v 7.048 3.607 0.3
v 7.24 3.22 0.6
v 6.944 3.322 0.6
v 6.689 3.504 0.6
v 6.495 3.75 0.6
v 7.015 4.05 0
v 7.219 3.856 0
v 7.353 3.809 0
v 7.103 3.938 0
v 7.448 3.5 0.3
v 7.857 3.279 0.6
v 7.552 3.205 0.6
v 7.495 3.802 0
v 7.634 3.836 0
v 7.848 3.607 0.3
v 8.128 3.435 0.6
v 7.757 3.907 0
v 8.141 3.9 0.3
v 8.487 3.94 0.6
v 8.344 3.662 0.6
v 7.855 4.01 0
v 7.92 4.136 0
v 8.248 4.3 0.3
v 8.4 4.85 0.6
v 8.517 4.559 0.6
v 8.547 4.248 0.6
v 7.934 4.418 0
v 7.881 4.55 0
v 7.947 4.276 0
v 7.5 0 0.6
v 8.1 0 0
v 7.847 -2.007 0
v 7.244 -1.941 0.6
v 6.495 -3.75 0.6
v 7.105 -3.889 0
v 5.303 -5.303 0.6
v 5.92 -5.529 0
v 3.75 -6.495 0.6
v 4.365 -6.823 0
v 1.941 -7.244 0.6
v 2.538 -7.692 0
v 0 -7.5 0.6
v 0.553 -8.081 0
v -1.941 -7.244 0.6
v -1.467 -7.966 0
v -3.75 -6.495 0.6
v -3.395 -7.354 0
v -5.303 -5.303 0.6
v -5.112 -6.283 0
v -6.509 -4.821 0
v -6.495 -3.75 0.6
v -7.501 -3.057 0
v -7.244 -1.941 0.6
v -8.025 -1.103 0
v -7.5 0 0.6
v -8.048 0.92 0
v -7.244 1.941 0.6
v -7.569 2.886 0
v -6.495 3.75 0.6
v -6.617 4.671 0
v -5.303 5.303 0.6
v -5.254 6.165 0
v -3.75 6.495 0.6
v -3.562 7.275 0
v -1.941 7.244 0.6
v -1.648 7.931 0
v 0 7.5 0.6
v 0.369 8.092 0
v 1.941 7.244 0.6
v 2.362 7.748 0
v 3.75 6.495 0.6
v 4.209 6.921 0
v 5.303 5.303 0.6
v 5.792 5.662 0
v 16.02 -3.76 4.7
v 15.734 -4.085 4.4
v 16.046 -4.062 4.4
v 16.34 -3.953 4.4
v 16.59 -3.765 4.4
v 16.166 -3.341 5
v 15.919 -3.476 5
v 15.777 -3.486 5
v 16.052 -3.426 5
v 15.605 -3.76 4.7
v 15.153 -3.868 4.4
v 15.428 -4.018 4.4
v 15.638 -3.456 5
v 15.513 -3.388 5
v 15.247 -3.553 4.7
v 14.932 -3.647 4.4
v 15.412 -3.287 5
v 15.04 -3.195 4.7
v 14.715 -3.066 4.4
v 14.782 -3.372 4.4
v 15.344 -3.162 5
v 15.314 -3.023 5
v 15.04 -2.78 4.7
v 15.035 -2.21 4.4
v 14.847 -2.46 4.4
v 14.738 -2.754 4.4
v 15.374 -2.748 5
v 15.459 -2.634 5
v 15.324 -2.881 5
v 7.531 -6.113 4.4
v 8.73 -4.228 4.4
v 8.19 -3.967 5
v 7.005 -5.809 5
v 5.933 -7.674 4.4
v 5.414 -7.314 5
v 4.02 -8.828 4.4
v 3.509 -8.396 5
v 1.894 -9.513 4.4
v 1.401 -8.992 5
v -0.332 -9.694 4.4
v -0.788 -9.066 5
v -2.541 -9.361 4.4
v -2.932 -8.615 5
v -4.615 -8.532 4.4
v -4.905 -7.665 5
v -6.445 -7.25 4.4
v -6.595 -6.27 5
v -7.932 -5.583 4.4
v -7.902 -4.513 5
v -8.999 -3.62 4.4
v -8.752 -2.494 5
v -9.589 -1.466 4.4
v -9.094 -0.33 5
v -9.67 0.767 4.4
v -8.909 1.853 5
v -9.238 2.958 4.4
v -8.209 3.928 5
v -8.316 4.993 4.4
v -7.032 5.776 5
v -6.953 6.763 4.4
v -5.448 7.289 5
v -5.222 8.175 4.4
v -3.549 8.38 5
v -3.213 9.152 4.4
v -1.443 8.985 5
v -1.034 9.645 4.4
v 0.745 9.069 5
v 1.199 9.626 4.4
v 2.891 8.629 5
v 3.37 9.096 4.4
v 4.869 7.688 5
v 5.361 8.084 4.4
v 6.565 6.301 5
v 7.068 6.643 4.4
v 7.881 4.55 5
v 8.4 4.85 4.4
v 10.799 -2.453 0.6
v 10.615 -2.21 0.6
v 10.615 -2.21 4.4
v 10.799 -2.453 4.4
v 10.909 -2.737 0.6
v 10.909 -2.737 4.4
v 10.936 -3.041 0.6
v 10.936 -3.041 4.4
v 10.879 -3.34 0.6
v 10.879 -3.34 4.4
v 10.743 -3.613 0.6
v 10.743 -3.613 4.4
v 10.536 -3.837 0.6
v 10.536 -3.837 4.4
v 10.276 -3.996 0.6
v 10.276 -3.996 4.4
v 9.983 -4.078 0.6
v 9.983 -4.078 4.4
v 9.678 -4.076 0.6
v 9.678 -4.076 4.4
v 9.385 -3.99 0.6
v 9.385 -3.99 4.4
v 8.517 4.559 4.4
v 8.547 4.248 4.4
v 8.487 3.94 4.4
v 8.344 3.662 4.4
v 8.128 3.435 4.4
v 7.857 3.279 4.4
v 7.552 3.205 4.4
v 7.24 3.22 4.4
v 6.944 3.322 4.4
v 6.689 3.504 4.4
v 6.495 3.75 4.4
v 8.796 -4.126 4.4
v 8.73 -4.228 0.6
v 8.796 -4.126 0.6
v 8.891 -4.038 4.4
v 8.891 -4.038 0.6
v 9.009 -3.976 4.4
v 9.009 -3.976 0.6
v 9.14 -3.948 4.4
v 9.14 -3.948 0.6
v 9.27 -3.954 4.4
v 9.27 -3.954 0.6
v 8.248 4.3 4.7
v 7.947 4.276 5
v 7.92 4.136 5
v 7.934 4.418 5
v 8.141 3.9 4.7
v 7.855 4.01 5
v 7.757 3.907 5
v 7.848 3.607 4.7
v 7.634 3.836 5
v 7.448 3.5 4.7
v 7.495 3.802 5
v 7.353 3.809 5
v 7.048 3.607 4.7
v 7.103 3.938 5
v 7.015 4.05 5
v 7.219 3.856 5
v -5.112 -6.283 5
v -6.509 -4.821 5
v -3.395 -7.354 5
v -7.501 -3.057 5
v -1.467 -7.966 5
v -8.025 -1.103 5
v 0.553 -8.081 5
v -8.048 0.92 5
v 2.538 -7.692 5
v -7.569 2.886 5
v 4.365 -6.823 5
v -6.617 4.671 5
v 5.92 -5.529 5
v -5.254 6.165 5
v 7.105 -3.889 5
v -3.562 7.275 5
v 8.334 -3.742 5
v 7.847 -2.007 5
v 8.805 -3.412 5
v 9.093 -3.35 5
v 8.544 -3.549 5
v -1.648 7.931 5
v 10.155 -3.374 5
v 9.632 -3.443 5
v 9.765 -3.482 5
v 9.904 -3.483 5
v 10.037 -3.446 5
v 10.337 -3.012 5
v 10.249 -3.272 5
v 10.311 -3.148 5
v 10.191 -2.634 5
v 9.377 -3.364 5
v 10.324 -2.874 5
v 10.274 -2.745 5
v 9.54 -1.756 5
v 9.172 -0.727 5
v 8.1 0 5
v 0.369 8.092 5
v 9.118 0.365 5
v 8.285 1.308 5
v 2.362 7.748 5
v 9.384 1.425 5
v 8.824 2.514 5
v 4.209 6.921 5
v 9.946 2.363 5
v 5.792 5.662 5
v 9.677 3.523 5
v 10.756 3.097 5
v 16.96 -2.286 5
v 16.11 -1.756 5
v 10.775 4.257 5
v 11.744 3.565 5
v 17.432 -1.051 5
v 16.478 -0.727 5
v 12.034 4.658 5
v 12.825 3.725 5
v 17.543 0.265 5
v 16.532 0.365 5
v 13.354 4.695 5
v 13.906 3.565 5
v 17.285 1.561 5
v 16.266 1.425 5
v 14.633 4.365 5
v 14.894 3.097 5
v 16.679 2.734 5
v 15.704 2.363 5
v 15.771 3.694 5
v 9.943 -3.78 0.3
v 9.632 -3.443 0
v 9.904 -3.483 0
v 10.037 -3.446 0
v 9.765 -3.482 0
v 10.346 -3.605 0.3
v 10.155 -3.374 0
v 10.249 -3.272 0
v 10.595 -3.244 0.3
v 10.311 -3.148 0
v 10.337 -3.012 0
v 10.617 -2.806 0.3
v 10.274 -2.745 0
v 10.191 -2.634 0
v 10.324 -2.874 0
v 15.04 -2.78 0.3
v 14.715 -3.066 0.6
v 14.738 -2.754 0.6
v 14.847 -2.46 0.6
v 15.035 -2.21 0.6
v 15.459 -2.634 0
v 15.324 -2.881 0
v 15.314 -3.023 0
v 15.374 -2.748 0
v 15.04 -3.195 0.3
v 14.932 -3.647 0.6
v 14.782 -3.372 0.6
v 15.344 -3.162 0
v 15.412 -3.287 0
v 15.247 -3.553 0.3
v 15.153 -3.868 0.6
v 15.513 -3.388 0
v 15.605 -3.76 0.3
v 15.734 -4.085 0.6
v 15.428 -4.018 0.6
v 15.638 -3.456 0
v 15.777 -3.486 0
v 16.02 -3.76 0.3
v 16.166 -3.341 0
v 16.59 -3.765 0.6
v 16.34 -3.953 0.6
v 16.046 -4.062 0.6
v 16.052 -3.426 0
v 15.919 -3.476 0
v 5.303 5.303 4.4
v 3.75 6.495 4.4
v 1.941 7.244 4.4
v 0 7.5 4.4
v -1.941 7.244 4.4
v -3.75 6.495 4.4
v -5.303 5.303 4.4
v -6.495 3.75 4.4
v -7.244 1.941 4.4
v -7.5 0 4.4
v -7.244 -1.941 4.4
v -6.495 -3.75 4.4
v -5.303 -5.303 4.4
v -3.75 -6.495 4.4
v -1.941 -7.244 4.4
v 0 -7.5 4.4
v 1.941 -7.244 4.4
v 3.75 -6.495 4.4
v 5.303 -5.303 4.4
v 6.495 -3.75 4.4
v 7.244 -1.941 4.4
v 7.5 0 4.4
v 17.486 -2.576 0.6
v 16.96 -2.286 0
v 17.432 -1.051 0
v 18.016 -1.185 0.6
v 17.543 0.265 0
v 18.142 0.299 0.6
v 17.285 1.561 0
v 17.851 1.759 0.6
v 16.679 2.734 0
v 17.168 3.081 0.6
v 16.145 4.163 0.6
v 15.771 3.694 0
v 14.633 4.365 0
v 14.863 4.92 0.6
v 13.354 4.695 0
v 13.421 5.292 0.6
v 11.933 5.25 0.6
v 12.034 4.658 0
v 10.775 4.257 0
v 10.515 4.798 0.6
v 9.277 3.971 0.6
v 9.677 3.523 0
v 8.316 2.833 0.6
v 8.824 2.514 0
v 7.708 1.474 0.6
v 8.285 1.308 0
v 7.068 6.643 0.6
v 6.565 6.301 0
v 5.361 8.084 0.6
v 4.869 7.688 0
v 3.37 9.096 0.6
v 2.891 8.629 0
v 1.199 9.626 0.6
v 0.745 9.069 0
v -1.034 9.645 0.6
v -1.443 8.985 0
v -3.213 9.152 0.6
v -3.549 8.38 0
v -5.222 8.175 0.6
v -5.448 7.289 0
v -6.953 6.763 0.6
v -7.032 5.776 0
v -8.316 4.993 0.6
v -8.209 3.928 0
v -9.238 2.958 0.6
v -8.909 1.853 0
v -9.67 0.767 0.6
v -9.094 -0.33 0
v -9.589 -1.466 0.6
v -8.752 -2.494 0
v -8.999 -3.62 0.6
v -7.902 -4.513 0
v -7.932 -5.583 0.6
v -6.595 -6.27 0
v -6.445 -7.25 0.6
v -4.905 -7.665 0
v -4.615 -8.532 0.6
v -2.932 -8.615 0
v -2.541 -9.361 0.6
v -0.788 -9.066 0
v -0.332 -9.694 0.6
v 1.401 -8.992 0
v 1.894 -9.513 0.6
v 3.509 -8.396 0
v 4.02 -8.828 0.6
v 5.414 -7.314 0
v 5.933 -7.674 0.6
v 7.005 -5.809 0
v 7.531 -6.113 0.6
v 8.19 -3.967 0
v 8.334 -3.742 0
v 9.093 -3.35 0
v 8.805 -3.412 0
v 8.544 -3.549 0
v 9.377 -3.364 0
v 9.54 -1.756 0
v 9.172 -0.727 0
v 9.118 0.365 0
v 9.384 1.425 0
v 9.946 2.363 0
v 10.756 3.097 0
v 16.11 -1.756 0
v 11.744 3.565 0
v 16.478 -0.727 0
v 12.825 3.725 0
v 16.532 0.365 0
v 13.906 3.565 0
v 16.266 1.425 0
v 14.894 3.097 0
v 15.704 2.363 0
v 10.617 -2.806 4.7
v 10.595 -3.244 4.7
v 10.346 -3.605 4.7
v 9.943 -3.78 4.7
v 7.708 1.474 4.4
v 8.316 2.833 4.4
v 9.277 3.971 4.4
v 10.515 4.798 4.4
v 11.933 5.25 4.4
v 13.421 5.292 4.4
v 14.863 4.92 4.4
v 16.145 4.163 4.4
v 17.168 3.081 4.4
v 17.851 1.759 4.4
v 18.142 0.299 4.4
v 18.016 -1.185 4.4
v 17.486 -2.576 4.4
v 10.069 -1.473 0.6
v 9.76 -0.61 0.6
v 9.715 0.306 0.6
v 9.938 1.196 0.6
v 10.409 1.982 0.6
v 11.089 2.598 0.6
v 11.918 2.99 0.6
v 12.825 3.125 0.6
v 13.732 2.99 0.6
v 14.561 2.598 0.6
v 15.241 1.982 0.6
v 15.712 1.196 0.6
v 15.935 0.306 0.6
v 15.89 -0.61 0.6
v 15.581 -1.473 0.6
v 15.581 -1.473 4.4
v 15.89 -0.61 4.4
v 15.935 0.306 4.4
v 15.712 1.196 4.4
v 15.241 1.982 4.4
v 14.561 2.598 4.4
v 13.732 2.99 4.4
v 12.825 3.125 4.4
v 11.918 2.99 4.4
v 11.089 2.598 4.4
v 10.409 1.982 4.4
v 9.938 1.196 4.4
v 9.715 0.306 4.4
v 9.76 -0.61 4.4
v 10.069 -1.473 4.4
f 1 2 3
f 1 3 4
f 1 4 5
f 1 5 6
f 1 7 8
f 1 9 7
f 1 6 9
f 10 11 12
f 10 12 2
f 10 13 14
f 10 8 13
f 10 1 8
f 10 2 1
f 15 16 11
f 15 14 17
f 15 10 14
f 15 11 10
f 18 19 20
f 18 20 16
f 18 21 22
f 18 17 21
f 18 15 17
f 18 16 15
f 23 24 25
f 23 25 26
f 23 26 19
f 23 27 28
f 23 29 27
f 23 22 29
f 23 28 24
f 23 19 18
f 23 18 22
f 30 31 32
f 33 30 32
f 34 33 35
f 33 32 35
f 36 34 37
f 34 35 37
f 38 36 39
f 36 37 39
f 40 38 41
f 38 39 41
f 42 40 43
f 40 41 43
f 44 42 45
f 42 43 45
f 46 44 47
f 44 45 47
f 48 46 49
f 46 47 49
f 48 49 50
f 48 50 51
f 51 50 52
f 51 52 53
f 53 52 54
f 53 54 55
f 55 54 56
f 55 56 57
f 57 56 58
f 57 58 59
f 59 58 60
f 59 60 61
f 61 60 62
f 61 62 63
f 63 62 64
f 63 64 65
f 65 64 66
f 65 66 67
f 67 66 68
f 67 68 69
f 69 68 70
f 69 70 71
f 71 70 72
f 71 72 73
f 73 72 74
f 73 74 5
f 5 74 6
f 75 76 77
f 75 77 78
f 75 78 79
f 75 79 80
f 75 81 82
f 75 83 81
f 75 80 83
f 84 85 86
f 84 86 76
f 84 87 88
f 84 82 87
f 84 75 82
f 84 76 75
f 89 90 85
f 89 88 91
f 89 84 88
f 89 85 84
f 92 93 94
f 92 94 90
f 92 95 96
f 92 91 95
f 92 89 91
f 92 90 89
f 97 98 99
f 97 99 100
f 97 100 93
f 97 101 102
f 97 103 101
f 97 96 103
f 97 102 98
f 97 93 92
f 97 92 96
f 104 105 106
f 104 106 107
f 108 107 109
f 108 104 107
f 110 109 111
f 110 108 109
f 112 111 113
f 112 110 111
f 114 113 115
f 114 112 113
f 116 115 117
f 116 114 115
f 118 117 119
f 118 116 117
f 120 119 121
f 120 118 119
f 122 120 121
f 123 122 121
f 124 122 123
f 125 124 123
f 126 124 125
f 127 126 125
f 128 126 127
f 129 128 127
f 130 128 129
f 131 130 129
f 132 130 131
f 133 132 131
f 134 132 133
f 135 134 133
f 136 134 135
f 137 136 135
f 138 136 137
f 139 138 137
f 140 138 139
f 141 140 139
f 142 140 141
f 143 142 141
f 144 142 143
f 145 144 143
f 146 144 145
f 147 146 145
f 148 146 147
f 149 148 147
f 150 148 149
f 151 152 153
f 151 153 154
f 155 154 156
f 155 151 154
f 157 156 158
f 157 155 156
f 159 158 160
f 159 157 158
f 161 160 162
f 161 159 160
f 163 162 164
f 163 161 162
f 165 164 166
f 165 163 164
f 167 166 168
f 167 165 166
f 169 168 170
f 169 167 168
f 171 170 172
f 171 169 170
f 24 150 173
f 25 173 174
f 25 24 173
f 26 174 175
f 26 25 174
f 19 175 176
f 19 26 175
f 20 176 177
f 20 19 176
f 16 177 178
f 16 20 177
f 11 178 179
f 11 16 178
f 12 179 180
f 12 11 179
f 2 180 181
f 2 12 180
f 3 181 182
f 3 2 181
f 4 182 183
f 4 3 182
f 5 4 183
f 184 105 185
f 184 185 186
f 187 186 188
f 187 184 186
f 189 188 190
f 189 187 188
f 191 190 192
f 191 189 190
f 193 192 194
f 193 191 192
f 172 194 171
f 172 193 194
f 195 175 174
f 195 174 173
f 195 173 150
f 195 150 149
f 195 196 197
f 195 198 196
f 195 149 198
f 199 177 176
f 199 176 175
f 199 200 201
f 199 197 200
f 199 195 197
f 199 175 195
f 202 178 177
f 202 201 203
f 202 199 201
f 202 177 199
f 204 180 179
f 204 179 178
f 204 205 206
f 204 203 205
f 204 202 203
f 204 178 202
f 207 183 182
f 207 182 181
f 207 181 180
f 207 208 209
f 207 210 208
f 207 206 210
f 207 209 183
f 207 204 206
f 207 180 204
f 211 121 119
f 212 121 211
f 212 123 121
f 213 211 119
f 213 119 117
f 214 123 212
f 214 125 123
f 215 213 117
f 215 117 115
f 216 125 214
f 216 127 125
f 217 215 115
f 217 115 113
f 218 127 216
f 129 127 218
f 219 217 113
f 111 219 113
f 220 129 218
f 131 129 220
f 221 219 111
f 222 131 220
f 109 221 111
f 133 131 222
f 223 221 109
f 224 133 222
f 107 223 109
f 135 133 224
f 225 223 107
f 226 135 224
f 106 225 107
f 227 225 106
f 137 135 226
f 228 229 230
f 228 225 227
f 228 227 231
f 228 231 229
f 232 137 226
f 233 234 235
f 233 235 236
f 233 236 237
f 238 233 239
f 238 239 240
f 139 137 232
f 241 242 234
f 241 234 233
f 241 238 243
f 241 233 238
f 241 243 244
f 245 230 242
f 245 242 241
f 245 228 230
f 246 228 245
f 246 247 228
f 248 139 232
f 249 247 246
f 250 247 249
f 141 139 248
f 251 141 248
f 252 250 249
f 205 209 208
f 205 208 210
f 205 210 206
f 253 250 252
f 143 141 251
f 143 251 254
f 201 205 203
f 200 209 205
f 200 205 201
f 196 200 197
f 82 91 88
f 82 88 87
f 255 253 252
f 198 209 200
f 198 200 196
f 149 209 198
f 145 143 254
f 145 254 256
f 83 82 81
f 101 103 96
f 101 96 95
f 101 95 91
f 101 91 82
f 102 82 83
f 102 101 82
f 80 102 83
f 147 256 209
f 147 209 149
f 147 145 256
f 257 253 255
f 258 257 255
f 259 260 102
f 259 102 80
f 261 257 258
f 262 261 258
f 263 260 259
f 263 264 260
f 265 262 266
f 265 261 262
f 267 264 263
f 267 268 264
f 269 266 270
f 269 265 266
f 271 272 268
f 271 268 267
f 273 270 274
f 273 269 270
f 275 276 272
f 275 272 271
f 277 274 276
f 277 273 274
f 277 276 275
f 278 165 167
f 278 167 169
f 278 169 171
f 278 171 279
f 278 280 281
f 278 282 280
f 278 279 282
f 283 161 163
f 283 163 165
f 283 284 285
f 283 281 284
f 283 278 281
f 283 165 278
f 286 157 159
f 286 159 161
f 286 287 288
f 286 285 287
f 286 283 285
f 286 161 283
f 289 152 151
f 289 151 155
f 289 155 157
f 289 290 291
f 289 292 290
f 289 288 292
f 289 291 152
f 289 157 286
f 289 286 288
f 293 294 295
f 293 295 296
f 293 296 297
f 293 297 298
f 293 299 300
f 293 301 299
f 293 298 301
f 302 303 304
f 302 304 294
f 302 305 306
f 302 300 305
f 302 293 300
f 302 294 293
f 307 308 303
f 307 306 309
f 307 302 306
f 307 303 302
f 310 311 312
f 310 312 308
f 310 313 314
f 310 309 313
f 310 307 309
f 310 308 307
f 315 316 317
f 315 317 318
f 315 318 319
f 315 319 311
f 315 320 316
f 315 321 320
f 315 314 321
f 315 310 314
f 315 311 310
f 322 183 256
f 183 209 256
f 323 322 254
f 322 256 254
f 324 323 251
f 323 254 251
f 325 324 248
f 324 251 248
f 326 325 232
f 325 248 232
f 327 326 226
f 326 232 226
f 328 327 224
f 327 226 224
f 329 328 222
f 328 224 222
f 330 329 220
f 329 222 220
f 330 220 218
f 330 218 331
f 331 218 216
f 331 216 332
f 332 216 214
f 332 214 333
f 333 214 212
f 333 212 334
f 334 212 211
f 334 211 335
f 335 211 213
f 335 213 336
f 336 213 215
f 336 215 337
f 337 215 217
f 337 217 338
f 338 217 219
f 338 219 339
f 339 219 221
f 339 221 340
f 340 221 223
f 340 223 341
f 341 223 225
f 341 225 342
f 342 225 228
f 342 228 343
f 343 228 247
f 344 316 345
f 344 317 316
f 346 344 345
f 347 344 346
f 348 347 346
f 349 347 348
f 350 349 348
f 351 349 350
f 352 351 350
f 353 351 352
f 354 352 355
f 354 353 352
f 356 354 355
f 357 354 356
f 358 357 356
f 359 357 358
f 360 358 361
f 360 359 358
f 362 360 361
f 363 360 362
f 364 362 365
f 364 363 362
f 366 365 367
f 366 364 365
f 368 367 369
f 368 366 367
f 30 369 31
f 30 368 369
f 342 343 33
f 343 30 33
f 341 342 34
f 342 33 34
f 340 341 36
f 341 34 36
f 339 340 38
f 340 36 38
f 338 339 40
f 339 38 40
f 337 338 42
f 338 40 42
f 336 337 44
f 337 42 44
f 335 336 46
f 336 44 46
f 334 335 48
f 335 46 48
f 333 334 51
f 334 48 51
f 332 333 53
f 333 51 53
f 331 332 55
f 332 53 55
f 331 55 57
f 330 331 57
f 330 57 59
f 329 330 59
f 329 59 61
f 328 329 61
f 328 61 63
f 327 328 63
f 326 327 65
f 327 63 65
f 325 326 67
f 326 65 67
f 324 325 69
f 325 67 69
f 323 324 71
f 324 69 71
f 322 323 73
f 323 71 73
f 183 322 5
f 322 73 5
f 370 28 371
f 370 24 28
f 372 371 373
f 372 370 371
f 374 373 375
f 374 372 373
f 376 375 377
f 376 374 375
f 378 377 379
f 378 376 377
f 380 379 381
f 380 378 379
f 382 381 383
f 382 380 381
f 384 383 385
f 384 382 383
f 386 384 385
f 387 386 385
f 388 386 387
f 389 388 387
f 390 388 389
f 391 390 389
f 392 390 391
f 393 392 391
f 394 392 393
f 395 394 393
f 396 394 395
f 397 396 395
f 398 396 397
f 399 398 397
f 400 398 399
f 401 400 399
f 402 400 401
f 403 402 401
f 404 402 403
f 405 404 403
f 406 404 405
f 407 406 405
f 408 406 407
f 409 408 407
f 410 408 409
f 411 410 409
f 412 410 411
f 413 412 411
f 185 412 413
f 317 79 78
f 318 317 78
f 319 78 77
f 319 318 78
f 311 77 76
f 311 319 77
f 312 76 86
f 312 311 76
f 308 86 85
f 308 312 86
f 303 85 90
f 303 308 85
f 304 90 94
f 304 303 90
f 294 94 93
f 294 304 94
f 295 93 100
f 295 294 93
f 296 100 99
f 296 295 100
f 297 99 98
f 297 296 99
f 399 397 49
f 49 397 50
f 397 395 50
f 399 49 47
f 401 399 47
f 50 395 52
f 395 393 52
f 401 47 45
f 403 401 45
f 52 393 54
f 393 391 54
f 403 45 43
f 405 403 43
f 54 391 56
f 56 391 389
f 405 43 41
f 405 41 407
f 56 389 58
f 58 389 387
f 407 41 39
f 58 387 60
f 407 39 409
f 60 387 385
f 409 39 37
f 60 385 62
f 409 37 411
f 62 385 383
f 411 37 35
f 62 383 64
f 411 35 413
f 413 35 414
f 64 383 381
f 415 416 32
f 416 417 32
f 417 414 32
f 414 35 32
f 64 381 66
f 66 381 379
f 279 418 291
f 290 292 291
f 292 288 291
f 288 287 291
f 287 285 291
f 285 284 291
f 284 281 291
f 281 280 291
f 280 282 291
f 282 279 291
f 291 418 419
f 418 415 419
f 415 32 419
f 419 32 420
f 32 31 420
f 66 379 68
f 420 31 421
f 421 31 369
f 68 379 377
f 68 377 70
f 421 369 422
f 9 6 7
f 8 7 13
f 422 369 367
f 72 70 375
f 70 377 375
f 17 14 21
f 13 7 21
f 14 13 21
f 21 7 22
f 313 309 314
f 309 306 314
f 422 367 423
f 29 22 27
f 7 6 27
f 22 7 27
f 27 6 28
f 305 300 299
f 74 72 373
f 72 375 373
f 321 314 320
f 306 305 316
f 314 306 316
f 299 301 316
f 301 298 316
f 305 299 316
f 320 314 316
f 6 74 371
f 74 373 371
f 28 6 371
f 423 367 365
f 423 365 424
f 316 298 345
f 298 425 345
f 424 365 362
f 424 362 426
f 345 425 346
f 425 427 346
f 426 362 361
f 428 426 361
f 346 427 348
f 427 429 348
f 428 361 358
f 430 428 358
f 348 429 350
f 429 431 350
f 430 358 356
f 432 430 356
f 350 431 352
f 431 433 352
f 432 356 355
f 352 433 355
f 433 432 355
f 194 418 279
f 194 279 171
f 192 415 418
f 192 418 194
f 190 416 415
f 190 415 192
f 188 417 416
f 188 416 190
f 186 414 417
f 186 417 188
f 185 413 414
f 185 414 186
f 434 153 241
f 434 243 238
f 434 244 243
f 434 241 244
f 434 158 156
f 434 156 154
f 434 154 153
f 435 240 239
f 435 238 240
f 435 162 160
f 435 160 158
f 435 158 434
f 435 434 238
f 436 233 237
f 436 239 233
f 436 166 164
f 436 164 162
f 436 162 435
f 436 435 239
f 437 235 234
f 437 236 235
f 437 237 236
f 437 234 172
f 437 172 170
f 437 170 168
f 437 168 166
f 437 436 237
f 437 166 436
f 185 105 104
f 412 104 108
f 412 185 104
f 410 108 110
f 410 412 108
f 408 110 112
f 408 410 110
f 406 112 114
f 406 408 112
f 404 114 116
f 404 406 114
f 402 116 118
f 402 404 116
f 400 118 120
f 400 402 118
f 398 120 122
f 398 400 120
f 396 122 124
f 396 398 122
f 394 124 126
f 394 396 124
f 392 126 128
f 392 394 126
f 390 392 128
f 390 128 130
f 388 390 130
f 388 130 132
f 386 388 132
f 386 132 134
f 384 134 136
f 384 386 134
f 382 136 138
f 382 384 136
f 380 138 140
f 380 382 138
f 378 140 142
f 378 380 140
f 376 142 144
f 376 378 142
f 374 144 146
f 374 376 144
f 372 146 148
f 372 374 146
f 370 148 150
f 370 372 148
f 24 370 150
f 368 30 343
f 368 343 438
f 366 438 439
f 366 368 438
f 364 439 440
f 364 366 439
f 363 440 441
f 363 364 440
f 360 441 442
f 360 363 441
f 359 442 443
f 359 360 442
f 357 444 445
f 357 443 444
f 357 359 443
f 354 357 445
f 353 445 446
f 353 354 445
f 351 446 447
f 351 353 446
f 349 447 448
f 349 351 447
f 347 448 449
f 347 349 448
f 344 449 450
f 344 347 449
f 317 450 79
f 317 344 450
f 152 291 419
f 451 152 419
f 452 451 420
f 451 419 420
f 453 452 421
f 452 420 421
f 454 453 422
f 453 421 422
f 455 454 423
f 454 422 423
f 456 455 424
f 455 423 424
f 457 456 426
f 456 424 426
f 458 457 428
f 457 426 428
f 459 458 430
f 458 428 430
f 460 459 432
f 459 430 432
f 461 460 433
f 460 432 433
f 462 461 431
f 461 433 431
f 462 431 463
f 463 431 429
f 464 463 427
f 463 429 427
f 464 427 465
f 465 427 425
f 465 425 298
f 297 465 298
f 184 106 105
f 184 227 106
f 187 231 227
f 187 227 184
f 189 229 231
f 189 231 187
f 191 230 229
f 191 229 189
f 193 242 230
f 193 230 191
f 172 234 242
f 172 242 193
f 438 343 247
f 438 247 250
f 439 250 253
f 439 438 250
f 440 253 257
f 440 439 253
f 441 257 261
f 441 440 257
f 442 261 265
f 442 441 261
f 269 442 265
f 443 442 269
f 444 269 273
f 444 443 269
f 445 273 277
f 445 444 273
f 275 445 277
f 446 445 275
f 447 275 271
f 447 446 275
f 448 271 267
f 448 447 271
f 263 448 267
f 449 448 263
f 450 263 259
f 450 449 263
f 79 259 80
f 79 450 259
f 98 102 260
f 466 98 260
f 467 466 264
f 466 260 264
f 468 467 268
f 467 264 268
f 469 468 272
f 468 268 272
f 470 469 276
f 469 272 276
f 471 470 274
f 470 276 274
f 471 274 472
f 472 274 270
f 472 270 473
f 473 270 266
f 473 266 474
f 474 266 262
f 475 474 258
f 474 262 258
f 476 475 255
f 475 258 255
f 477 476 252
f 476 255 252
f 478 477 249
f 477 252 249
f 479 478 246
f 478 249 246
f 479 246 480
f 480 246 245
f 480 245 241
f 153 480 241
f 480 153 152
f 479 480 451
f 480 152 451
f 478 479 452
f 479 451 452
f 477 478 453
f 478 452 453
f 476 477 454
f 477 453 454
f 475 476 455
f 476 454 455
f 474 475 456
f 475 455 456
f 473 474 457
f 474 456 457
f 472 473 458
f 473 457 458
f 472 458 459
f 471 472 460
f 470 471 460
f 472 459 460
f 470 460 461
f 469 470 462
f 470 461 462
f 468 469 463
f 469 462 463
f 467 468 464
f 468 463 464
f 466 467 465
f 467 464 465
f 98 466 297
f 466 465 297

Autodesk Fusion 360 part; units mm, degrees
sketch "Sketch1" plane through (0, 0, 0) normal (0, 0, 1) x (1, 0, 0)
  circle A0 centre (0, 0) radius 7.5
  circle A1 centre (0, 0) radius 9.7
  circle A2 centre (12.825, 0) radius 3.125
  circle A3 centre (12.825, 0) radius 5.325
  line L0 (-19.1275, 0) -> (19.1275, 0) construction
  line L1 (0, 53.4087) -> (0, -53.4087) construction
  circle A4 centre (9.8375, -2.9875) radius 1.1
  circle A5 centre (15.8125, -2.9875) radius 1.1
  circle A6 centre (7.4478, 4.3) radius 1.1
  line L2 (0, 0) -> (7.4478, 4.3) construction
  line L3 (0, 0) -> (12.825, 0) construction
  line L4 (9.8375, -2.9875) -> (12.825, 0) construction
  line L5 (15.8125, -2.9875) -> (12.825, 0) construction
  line L6 (9.8375, -2.9875) -> (15.8125, -2.9875) construction
  dimension "d5_1_1_2_1" = 15
  dimension "d6_1_1_2_1" = 2.2
  dimension "d7_1_1_2_1" = 6.25
  dimension "d9_1_1_2_1" = 2.2
  dimension "d17_1_1_2_1" = 2.2
  dimension "d18_1_1_2_1" = 2.2
  dimension "d23_1_1_2_1" = 2.2
  dimension "d32_1" = 90
  dimension "d34_1" = 90
  dimension "d36" = 30
extrude "Extrude1" add sketch "Sketch1" along normal blind 5 contours A0 A1 A3 A6 | A1 A3 A4 | A6 | A1 A2 A3 A5 | A1 A3 A4 | A1 A2 A4 | A1 A4 | A1 A4 | A5 picked at (6.1847, 5.9307)
fillet "Fillet1" radius 0.5 1 edges at (8.9752, -3.679, 2.5)
chamfer "Chamfer2" distance 0.6 angle 45 16 edges at (10.7426, -3.6127, 5) (9.0094, -3.9762, 5) (-9.6936, -0.3518, 5) (7.9978, 3.3474, 5) (-7.2444, -1.9411, 5) (14.8628, 4.9197, 5) (15.0347, -3.7653, 5) (12.825, 3.125, 5) (10.7426, -3.6127, 0) (9.0094, -3.9762, 0) (-9.6936, -0.3518, 0) (7.9978, 3.3474, 0) (-7.2444, -1.9411, 0) (14.8628, 4.9197, 0) (15.0347, -3.7653, 0) (12.825, 3.125, 0)
equation "d6_1_1_2_1 = ClipWall"
equation "d9_1_1_2_1 = ClipWall"
equation "d17_1_1_2_1 = ClipWall"
equation "d18_1_1_2_1 = ClipWall"
equation "d21_1_1_2_1 = Thickness"
equation "d23_1_1_2_1 = ClipWall"
equation "ClipWall = 2.2 mm"
equation "Thickness = 5 mm"
